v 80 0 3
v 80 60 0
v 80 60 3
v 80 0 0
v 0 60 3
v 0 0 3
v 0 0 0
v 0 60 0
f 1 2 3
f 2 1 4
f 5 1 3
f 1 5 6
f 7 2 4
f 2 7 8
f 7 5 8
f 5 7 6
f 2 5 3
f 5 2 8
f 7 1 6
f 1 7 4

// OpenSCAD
// --- Dimensions ---

// Base Plate dimensions
plate_length_x = 80;  // X dimension of the flat plate (mm)
plate_width_y = 60;   // Y dimension of the flat plate (mm)
plate_thickness = 3;  // Z thickness of the flat plate (mm)

// Camera Hole dimensions
camera_hole_diameter = 12; // Diameter of the hole for the phone camera (mm)
camera_hole_x = -20;       // X position of the camera hole center (mm)
camera_hole_y = 10;        // Y position of the camera hole center (mm)

// Sleeve dimensions
sleeve_outer_diameter = 36.6; // Outer diameter of the round sleeve (mm)
sleeve_inner_bore_stop_z = 11; // Z height where inner bore changes (mm)
sleeve_inner_bore_start_z = 3;  // Z height where inner bore starts (mm)
sleeve_inner_bore_diameter = 22; // Diameter of the stop bore (mm)
sleeve_outer_top_diameter = 30.6; // Diameter for eyepiece sliding section (mm)

// Screw hole dimensions
screw_hole_diameter = 2.5;  // Diameter for M3 centering screws (mm)
screw_hole_z_level = 21;    // Z height where screw holes are located (mm)
num_screws = 3;             // Number of radial mounting screws

// Total sleeve height calculation: The top must accommodate the required features. Since the last feature is at Z=21, and we need space above it for the eyepiece to slide over, let's set the total height such that the top surface is clearly defined, ensuring all internal cuts are covered. We will use a height of 34mm (Z=0 to Z=34) for the sleeve structure relative to its base at Z=0 in the module, which translates to Z=3+31=34 overall if we consider the top surface needed.
total_sleeve_height = 32; // Height from Z=3 up to Z=35 (if plate is 3mm thick)

// --- Constants ---
$fn = 64; // High resolution for curves

// --- Modules ---

// Module to create the main plate
module base_plate() {
    cube([plate_length_x, plate_width_y, plate_thickness]);
}

// Module to cut the camera hole through the plate
module camera_hole_cutter() {
    translate([camera_hole_x, camera_hole_y, -0.1]) { // Extend slightly below Z=0
        cylinder(h = plate_thickness + 0.2, r = camera_hole_diameter / 2);
    }
}

// Module to create the sleeve structure
module round_sleeve() {
    // The sleeve is centered on the X/Y plane of the hole for placement later
    translate([0, 0, 0]) { // Sleeve starts at Z=0 relative to its own module origin (which will be translated by plate_thickness)

        difference() {
            // 1. Outer shape (full height) - Using the largest OD for the main body structure
            cylinder(h = total_sleeve_height + 0.2, r = sleeve_outer_diameter / 2);

            // 2. Inner bore section 1 (Stop: Z=3 to Z=11)
            translate([0, 0, sleeve_inner_bore_start_z]) {
                cylinder(h = sleeve_inner_bore_stop_z - sleeve_inner_bore_start_z + 0.2, r = sleeve_inner_bore_diameter / 2);
            }

            // 3. Inner bore section 2 (Eyepiece slide: Z=11 to Top)
            translate([0, 0, sleeve_inner_bore_stop_z]) {
                cylinder(h = total_sleeve_height - sleeve_inner_bore_stop_z + 0.2, r = sleeve_outer_top_diameter / 2);
            }

            // 4. Screw holes (Radial cuts through the wall at Z=21)
            for (i = [0 : num_screws - 1]) {
                angle = i * (360 / num_screws);
                rotate([0, 0, angle]) {
                    // Cut a hole centered on the sleeve axis, extending through the wall thickness.
                    translate([0, 0, screw_hole_z_level - 0.1]) {
                        cylinder(h = 1.0 + 0.2, r = screw_hole_diameter / 2);
                    }
                }
            }
        }
    }
}

// --- Assembly ---

difference() {
    // 1. Base Plate (rests on Z=0)
    base_plate();

    // 2. Cut Camera Hole in the plate
    camera_hole_cutter();

    // 3. Sleeve structure placed on top of the plate (starts at Z=plate_thickness)
    translate([camera_hole_x, camera_hole_y, plate_thickness]) {
        round_sleeve();
    }
}
